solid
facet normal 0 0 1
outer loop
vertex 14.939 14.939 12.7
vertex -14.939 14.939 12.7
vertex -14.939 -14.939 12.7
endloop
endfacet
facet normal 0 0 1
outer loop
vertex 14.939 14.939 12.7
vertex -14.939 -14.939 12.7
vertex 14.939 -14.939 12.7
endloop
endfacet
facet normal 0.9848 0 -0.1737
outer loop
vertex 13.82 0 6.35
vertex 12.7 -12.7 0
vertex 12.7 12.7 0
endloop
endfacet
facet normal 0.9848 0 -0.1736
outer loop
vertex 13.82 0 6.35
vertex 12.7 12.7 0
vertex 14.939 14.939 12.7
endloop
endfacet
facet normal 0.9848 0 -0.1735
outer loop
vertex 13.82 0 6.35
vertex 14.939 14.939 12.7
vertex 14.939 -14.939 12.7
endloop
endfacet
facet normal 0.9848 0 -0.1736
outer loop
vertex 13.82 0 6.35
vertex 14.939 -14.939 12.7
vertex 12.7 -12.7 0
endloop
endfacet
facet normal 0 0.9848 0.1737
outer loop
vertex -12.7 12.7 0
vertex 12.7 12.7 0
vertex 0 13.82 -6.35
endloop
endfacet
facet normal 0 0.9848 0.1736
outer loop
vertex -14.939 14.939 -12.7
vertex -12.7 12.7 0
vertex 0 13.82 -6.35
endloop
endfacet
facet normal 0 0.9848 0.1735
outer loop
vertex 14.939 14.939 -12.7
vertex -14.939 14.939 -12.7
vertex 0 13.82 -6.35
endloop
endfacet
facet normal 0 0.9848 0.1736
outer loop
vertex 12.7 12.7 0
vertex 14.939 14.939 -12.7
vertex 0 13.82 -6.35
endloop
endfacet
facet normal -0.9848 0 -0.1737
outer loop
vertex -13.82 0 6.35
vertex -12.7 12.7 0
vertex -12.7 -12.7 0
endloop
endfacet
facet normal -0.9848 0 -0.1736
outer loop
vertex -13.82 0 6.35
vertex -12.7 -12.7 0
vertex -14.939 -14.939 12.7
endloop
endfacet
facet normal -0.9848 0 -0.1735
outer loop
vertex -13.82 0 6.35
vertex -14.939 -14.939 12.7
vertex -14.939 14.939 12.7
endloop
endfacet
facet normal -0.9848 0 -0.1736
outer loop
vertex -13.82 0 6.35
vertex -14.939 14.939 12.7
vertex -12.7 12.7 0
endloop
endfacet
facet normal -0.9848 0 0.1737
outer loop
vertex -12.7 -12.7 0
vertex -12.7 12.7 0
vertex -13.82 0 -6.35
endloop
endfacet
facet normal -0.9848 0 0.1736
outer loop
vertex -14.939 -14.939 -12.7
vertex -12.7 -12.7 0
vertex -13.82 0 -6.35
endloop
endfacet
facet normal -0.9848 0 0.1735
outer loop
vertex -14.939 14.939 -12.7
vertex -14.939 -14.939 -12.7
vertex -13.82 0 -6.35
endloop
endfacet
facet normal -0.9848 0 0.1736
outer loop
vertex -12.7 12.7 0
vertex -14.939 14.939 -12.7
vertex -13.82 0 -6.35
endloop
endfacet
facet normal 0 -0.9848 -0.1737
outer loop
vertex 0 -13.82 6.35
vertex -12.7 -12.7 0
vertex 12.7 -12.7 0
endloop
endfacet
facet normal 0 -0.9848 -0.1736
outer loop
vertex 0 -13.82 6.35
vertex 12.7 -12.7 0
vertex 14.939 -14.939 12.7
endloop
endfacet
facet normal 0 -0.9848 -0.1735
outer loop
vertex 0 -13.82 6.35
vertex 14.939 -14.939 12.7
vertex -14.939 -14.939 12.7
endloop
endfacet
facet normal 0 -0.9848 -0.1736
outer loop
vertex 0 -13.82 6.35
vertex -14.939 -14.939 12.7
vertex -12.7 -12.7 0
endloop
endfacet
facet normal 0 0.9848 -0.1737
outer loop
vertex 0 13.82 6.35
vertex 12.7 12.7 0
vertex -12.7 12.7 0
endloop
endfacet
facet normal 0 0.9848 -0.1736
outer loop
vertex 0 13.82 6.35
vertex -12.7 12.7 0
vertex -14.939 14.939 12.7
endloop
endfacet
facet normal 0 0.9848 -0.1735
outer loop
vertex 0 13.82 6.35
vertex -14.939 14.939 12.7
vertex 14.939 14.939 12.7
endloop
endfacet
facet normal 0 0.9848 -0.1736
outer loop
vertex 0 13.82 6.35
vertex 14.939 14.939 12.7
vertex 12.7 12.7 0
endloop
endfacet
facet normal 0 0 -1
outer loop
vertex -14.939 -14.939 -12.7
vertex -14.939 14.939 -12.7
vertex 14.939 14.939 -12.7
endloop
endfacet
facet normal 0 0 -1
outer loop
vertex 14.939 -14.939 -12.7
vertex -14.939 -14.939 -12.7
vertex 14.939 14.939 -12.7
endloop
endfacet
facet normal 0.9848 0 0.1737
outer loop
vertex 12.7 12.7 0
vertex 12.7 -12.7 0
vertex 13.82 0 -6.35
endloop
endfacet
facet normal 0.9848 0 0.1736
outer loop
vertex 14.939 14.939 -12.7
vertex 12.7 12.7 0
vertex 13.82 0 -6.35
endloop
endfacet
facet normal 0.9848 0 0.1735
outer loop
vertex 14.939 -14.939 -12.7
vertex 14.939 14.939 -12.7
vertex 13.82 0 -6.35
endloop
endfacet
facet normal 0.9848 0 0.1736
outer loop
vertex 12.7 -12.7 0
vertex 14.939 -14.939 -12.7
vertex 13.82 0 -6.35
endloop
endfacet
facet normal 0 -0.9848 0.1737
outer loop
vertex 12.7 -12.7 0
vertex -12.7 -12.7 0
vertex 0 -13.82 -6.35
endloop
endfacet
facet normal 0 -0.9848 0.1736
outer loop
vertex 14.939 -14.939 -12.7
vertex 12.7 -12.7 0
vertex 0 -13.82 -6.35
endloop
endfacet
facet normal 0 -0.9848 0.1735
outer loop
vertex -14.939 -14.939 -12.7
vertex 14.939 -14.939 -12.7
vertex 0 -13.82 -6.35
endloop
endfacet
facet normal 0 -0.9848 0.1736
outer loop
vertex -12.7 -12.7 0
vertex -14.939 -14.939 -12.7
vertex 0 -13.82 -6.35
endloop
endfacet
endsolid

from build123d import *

# Parameters (mm, degrees)
F0_W     = 25.4
F0_H     = 25.4
F1_DEPTH = 12.7
F1_TAPER = -10


with BuildPart() as f1:
    # F0 (on Top) → F1 (new body, symmetric)
    with BuildSketch(Plane.XY):
        Rectangle(F0_W, F0_H)
    extrude(amount=F1_DEPTH, both=True, taper=F1_TAPER)


solid = f1.part
